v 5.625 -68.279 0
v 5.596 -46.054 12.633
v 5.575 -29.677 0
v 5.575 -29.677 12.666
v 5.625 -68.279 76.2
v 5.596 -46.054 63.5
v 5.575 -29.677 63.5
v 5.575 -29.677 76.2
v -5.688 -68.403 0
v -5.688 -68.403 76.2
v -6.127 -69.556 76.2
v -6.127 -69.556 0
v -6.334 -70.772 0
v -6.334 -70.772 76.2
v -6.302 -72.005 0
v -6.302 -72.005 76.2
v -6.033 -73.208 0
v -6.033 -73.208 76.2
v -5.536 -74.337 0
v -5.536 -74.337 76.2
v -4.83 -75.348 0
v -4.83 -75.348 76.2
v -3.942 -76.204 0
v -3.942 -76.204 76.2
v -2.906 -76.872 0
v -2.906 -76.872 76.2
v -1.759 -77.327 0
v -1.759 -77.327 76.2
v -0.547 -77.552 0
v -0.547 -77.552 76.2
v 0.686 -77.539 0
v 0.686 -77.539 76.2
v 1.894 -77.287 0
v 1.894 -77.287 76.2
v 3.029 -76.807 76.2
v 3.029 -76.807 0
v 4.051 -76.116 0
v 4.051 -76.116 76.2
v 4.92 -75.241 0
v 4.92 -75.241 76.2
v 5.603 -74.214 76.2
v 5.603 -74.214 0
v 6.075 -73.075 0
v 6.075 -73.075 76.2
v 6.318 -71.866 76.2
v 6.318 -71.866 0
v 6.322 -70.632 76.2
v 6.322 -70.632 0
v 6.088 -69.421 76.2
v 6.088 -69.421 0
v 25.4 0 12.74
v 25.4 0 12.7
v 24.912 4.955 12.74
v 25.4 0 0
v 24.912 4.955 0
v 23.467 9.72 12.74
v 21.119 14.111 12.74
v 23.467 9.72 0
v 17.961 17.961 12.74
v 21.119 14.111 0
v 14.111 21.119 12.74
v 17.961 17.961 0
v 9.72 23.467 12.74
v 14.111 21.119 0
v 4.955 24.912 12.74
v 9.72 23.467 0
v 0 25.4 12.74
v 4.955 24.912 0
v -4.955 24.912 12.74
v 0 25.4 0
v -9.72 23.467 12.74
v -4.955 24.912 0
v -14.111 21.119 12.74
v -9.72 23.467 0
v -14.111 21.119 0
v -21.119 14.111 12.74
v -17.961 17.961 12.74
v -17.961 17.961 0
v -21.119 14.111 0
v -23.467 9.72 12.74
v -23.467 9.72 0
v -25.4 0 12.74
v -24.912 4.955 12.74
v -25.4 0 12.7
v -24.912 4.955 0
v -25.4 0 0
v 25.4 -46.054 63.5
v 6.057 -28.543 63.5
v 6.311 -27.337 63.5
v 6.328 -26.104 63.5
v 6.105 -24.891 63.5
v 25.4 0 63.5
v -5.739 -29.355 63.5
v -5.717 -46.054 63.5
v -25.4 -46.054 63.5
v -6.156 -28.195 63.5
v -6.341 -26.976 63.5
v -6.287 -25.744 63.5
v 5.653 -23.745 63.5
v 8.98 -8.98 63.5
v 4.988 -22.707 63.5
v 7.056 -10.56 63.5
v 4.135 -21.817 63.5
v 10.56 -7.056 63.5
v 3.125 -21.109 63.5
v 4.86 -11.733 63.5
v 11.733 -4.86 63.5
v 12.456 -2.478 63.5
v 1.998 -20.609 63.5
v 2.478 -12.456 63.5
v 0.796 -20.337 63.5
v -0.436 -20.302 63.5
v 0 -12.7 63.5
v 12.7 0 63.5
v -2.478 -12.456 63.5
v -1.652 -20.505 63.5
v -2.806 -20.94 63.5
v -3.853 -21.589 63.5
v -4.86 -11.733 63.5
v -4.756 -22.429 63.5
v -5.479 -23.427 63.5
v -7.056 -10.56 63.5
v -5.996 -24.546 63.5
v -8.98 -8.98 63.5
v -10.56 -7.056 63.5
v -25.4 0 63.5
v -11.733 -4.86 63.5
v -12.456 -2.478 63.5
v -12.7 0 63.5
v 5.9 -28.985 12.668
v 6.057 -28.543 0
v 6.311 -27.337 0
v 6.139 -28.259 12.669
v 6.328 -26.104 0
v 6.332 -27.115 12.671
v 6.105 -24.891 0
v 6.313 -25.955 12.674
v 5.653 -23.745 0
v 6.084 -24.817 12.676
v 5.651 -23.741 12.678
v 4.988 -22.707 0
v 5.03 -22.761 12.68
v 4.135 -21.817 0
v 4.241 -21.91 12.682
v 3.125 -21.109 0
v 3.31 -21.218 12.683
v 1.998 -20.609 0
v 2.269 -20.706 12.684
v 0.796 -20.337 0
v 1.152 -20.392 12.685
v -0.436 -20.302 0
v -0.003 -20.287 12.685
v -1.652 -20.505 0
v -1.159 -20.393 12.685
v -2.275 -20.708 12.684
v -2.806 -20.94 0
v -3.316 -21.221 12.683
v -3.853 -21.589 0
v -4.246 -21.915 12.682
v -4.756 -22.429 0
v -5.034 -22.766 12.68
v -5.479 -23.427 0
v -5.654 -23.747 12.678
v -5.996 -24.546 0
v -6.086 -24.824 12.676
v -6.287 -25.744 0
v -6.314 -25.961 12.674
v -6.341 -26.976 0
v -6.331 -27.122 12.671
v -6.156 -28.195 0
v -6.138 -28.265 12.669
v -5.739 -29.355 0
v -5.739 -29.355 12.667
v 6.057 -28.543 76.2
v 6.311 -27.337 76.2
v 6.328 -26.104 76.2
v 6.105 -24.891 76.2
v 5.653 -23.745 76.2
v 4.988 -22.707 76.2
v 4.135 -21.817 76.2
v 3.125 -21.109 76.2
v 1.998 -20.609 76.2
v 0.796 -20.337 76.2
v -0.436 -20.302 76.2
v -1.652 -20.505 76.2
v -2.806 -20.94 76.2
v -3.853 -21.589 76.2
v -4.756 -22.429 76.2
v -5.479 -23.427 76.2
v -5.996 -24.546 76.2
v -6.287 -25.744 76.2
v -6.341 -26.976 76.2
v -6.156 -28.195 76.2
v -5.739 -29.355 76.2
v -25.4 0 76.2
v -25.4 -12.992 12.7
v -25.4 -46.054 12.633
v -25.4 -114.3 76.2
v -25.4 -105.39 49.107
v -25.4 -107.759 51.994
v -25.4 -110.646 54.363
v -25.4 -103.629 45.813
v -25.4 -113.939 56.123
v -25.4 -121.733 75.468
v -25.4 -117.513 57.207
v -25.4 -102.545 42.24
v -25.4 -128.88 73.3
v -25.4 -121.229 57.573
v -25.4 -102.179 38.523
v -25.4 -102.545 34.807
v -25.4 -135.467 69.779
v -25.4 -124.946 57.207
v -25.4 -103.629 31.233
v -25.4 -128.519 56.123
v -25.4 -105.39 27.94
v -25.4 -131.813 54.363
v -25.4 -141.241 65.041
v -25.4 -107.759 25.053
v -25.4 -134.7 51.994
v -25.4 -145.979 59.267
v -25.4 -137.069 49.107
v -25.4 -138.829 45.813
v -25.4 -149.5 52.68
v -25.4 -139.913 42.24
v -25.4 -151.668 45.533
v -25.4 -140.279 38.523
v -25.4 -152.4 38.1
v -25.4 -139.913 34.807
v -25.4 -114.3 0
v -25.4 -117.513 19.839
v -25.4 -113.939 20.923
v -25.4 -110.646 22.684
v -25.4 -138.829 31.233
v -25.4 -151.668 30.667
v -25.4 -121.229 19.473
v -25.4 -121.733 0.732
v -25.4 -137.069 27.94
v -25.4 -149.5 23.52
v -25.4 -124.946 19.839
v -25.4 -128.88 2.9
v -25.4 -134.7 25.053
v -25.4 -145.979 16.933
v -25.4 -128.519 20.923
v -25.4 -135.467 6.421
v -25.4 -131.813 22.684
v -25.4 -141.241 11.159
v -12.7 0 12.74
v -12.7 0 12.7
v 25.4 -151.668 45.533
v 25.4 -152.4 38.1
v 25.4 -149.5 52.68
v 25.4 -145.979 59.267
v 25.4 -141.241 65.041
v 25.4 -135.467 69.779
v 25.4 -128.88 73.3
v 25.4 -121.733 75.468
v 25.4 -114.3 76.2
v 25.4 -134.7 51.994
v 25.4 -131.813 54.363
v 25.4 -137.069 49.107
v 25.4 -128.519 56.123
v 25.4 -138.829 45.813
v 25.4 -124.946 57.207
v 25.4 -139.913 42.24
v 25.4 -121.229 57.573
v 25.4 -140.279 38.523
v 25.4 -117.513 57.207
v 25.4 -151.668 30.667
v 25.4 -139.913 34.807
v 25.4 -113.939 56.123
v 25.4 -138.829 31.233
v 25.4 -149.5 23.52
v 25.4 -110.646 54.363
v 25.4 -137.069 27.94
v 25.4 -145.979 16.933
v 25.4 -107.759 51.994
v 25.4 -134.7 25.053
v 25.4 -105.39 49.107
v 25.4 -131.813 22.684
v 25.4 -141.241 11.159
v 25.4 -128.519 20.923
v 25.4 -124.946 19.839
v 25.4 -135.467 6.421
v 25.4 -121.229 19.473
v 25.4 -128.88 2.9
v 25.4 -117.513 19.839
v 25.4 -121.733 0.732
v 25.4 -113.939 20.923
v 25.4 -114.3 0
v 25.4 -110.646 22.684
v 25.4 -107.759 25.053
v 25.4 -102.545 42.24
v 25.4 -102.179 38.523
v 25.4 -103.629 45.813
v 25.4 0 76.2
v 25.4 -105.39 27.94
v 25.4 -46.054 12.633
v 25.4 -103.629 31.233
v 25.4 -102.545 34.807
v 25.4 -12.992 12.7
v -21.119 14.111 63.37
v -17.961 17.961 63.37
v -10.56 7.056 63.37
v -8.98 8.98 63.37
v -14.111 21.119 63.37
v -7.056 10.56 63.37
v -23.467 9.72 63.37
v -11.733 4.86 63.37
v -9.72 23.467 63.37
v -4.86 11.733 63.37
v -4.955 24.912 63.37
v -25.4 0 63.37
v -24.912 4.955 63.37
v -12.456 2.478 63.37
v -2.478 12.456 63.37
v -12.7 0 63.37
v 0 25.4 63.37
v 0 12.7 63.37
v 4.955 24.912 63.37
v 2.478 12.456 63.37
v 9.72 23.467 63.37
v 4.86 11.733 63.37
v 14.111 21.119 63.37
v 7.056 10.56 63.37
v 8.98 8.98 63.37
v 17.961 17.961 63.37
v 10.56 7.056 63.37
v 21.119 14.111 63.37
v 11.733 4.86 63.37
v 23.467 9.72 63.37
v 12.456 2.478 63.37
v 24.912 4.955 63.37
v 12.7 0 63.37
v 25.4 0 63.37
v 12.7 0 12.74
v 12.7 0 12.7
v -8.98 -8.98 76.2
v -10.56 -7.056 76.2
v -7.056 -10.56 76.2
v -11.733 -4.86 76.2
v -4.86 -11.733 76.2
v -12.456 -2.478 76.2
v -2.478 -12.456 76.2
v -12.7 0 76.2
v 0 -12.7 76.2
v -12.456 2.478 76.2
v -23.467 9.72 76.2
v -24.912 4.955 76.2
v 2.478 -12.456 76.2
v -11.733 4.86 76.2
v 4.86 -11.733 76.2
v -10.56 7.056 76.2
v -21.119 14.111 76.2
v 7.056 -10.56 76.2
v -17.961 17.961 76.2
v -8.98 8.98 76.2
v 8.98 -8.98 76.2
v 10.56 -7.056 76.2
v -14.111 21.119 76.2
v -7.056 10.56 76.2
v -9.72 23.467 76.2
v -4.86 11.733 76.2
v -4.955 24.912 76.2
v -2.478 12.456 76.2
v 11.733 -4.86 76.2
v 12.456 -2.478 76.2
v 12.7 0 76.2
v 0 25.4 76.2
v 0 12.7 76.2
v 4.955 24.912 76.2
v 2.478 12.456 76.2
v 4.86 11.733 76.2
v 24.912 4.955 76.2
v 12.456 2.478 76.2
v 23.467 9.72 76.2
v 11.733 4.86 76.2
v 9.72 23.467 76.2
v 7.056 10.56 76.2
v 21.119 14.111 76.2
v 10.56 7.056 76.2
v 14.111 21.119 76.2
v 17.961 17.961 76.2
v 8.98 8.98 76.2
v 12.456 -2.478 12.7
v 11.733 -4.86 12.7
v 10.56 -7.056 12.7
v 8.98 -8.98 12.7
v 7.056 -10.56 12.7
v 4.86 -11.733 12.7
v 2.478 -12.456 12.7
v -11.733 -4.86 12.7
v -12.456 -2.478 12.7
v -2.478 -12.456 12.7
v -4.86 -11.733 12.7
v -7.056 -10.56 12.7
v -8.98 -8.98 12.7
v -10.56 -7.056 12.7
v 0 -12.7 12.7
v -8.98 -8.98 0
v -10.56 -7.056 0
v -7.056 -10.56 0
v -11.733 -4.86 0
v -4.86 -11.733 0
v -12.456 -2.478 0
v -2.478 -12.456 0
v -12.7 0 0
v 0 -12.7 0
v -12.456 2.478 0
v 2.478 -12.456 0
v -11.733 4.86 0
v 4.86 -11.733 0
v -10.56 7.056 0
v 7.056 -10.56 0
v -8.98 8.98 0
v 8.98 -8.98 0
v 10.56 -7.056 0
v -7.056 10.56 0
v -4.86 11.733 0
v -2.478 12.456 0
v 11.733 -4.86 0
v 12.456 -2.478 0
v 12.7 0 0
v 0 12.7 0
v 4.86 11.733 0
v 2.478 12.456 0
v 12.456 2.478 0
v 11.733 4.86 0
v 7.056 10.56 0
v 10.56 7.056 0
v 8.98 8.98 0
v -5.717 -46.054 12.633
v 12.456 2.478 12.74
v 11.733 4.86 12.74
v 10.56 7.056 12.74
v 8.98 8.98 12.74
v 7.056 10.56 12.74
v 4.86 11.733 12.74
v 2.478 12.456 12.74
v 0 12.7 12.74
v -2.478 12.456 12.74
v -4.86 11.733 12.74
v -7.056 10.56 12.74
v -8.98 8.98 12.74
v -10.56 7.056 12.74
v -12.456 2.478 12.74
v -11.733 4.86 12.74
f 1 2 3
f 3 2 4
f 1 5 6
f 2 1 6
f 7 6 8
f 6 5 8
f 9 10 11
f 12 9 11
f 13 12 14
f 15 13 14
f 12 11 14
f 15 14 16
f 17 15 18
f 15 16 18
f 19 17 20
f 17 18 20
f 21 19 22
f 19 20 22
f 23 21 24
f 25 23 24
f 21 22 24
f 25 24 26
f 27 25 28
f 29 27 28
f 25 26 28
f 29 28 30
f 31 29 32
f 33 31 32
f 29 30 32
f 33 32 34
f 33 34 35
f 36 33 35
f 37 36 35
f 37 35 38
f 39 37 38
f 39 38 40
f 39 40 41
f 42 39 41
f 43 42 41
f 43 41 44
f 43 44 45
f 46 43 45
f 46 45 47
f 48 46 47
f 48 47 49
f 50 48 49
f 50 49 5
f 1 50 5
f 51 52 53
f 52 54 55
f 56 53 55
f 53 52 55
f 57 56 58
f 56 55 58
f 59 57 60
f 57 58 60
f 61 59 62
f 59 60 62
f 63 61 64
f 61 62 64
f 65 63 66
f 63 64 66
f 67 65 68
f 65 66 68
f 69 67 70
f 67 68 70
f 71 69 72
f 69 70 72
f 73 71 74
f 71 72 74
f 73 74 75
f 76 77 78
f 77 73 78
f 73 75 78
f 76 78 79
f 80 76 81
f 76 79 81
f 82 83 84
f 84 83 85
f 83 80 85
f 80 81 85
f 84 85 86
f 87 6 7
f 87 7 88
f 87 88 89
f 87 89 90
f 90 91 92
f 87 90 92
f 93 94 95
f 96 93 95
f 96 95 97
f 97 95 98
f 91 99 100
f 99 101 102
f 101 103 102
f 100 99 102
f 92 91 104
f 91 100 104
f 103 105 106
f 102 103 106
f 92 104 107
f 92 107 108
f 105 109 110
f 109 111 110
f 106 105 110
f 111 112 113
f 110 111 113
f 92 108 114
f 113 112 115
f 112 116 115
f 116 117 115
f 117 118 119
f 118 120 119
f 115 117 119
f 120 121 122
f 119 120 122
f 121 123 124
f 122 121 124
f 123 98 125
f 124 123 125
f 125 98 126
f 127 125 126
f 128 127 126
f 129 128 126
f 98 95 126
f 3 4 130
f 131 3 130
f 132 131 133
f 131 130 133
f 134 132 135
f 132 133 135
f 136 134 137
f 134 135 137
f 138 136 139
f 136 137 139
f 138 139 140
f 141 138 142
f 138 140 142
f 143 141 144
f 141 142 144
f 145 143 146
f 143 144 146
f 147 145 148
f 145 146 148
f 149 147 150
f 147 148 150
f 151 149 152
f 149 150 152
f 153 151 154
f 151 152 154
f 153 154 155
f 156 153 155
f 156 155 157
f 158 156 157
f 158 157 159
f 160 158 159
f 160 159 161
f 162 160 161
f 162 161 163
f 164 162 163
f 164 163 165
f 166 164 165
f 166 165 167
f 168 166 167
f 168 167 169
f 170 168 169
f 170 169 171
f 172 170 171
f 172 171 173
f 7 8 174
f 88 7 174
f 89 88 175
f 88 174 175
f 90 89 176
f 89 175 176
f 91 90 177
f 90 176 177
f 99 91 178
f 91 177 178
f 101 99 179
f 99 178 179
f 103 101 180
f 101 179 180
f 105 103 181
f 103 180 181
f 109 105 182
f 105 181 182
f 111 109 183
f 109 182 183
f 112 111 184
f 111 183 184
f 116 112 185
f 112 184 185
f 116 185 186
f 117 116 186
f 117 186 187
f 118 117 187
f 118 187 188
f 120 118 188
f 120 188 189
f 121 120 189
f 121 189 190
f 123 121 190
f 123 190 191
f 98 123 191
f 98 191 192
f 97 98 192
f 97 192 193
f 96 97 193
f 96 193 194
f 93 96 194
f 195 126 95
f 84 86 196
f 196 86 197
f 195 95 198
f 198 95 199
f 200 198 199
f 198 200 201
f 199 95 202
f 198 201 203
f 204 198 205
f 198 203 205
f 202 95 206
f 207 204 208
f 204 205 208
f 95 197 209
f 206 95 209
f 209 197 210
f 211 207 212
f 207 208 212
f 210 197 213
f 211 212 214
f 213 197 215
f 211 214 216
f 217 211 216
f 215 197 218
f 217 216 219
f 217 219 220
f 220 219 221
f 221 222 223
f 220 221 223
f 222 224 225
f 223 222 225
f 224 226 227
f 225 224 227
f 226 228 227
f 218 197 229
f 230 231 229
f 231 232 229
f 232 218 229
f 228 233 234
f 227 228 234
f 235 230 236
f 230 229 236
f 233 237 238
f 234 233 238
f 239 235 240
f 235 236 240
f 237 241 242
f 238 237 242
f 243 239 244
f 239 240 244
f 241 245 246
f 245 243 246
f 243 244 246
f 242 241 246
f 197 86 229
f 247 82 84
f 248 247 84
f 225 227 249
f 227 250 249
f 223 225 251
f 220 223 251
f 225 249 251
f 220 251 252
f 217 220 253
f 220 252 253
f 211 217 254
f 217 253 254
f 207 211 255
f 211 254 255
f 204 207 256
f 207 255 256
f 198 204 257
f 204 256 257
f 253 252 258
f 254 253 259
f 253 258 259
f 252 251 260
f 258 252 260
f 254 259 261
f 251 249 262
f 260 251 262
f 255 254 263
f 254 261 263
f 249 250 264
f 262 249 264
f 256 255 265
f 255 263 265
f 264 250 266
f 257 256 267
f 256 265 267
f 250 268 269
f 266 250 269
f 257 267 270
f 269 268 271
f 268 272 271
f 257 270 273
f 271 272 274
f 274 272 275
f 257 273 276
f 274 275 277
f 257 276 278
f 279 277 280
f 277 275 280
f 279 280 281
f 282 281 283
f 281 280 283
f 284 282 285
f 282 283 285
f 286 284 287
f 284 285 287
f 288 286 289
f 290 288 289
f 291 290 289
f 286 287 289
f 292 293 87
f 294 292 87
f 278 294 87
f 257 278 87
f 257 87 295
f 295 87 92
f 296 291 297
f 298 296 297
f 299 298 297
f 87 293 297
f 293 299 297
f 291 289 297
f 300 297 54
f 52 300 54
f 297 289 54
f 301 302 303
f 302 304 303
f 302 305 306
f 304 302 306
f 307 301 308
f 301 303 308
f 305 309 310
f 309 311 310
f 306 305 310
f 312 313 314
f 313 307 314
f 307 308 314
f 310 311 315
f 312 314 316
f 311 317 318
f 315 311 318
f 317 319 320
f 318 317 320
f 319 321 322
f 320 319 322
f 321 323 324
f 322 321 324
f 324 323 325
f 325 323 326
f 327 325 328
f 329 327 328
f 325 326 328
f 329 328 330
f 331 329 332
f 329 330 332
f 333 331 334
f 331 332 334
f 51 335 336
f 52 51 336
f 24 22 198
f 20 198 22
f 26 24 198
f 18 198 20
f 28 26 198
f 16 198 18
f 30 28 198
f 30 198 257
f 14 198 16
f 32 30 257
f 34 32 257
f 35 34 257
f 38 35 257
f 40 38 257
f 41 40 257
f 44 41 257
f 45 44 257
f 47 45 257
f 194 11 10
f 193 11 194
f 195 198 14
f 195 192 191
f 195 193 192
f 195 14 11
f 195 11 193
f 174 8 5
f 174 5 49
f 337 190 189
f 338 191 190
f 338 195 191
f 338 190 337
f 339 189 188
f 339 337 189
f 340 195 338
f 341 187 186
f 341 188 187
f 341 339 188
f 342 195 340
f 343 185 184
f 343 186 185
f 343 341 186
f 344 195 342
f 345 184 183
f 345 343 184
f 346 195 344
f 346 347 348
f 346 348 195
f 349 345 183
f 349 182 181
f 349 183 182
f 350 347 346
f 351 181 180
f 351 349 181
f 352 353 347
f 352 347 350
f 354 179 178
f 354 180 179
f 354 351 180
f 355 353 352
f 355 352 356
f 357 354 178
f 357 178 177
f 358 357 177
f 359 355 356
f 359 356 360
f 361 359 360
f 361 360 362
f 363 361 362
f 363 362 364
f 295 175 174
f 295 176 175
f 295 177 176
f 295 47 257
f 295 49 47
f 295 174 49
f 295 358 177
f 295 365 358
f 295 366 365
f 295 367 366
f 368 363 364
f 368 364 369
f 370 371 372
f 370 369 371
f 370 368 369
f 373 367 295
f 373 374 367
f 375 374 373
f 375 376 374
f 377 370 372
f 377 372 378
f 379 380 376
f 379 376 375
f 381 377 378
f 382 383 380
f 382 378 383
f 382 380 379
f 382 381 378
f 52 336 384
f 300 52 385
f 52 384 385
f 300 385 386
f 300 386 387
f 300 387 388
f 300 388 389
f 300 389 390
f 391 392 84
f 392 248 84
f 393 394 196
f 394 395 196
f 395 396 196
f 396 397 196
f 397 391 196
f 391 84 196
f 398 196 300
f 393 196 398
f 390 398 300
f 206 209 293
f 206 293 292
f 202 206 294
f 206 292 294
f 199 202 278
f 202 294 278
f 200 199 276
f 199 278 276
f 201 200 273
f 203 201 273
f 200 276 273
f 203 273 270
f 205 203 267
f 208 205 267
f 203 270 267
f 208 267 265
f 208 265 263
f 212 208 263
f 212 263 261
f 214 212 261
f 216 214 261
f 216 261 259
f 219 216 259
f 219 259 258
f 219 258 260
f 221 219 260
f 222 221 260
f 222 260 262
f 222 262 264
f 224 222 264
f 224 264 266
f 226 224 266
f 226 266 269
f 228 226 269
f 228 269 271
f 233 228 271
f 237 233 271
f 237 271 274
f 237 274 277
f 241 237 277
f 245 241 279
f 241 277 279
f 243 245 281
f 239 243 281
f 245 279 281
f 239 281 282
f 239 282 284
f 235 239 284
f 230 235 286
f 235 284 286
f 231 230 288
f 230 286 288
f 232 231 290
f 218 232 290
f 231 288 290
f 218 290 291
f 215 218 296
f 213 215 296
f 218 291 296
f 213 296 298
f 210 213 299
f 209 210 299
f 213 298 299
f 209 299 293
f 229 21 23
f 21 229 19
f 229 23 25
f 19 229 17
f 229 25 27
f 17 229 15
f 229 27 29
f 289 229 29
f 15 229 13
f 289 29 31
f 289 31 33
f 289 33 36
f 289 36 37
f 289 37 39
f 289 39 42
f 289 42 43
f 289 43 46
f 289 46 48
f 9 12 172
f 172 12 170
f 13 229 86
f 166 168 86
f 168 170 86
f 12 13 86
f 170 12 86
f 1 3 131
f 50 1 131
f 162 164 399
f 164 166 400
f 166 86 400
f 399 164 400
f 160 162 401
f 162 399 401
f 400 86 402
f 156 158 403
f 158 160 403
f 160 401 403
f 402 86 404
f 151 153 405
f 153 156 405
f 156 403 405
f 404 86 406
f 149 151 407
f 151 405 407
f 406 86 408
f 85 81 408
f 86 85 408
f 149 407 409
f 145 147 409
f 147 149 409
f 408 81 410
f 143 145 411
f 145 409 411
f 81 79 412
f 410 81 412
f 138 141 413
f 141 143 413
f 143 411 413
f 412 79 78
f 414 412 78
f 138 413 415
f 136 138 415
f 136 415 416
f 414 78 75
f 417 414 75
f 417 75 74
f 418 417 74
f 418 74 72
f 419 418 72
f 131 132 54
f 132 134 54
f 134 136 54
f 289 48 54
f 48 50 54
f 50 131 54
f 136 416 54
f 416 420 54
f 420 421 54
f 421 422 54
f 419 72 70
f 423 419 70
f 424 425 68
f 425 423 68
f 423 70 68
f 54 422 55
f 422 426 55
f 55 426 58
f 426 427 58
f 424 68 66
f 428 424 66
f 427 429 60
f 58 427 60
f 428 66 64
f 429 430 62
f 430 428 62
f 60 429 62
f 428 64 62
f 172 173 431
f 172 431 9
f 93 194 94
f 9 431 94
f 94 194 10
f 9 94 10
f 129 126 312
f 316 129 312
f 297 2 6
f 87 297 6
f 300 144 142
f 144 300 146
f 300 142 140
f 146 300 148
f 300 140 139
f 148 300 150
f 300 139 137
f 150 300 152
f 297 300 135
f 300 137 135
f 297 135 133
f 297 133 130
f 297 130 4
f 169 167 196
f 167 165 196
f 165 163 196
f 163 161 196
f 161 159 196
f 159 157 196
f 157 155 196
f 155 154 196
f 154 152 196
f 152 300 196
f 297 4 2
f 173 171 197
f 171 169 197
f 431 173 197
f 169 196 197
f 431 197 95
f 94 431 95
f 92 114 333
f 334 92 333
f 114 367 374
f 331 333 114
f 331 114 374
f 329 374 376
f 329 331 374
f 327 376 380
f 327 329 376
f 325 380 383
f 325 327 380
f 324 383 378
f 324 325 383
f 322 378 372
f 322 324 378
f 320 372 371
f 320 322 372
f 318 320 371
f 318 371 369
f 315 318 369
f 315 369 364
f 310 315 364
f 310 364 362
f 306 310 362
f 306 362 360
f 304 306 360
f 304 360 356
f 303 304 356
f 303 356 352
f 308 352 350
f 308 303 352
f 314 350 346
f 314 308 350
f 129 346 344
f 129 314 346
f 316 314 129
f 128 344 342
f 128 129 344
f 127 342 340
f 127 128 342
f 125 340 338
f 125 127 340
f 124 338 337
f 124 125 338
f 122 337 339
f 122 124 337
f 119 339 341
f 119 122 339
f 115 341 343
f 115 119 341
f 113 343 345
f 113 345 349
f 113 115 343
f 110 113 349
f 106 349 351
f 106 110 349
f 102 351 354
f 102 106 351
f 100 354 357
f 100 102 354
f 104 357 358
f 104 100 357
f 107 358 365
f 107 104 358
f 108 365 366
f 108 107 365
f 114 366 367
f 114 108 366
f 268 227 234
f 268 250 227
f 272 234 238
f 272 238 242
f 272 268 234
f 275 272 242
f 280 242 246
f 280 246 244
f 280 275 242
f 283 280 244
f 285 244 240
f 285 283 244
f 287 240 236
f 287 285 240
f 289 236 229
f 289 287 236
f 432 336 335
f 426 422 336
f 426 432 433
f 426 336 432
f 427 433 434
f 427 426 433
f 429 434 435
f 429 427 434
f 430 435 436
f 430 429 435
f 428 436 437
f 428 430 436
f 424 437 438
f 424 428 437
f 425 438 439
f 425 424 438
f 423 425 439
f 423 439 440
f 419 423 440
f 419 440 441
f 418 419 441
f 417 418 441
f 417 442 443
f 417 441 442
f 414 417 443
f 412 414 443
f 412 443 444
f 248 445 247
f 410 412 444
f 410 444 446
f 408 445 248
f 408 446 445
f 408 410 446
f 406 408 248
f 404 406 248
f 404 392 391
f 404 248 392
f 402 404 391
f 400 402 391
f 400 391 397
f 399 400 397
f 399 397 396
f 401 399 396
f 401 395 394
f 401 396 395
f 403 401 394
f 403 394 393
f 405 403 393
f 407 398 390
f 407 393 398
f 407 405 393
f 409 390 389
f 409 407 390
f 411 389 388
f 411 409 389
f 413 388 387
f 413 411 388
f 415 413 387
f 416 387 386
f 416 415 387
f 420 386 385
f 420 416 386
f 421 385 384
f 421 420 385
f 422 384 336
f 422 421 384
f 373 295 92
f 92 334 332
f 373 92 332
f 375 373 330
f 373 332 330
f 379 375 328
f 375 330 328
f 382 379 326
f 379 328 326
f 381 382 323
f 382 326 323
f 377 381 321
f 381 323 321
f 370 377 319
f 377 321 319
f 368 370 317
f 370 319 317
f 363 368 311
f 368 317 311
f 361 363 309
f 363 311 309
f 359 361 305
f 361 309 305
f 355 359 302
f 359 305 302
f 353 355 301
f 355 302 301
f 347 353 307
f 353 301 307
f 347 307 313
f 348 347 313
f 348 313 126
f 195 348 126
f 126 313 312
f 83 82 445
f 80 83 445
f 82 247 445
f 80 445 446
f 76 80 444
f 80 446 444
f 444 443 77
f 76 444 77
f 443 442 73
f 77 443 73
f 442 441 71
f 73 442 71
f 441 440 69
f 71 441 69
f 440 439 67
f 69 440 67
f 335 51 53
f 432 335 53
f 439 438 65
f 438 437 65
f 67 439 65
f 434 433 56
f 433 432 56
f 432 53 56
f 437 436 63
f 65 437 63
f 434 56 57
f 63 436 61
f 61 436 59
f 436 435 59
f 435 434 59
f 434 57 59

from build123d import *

# Parameters (mm, degrees)
F0_R      = 12.7
F1_DEPTH  = 76.2
F2_R      = 38.09999
F3_R      = 19.05
F4_DEPTH  = 50.801
F6_DEPTH  = 76.201
F8_DEPTH  = 50.801
F11_DEPTH = 50.801


# Not quite as in the source:
# - a fillet or chamfer is up to 0.001 mm smaller than in the source, because OpenCascade refuses the exact size


with BuildPart() as f1:
    # F0 (on Top) → F1 (new body)
    with BuildSketch(Plane.XY):
        with BuildLine():
            Line((25.4, -152.4), (25.4, 0))
            ThreePointArc((25.4, 0), (0, 25.4), (-25.4, 0))
            Line((-25.4, 0), (-25.4, -152.4))
            Line((-25.4, -152.4), (25.4, -152.4))
        make_face()
        Circle(F0_R, mode=Mode.SUBTRACT)
    extrude(amount=F1_DEPTH)

    # F2 (radius 38.1 in the source; OpenCascade refuses exactly that, so slightly less here)
    f2_edges = [f1.edges().sort_by_distance(p)[0] for p in [
        (0, -152.4, 76.2),
        (0, -152.4, 0),
    ]]
    fillet(f2_edges, radius=F2_R)

    # F3 (on face) → F4 (cut, through all)
    with BuildSketch(Plane.YZ.offset(25.4)):
        with Locations((-121.2292984128, 38.5233350098)):
            Circle(F3_R)
    extrude(amount=-F4_DEPTH, mode=Mode.SUBTRACT)

    # F5 (on face) → F6 (cut, through all)
    with BuildSketch(Plane.XY.offset(76.2)):
        with BuildLine():
            Line((-5.7387360482, -29.3549266663), (-5.6882195357, -68.4034783226))
            ThreePointArc((-5.6882195357, -68.4034783226), (0.0700403354, -77.5756190124), (5.6245744634, -68.2786909069))
            Line((5.6245744634, -68.2786909069), (5.5746364254, -29.6772918832))
            ThreePointArc((5.5746364254, -29.6772918832), (0.1808646036, -20.2891562763), (-5.7387360482, -29.3549266663))
        make_face()
    extrude(amount=-F6_DEPTH, mode=Mode.SUBTRACT)

    # F7 (on face) → F8 (cut, through all)
    with BuildSketch(Plane(origin=(-25.4, 0, 0), x_dir=(0, -1, 0), z_dir=(-1, 0, 0))):
        Polygon((0, 63.5), (0, 12.7), (12.9918251187, 12.7), (46.0542105138, 12.633157894), (46.0542105138, 63.5), (12.9918251187, 63.5), align=None)
    extrude(amount=-F8_DEPTH, mode=Mode.SUBTRACT)

    # F10 (on offset) → F11 (cut, through all)
    with BuildSketch(Plane.YZ.offset(25.4)):
        Polygon((25.4299268126, 63.3701309562), (0, 63.3701309562), (0, 12.7395335585), (25.4423227161, 12.7395335585), align=None)
    extrude(amount=-F11_DEPTH, mode=Mode.SUBTRACT)


solid = f1.part
